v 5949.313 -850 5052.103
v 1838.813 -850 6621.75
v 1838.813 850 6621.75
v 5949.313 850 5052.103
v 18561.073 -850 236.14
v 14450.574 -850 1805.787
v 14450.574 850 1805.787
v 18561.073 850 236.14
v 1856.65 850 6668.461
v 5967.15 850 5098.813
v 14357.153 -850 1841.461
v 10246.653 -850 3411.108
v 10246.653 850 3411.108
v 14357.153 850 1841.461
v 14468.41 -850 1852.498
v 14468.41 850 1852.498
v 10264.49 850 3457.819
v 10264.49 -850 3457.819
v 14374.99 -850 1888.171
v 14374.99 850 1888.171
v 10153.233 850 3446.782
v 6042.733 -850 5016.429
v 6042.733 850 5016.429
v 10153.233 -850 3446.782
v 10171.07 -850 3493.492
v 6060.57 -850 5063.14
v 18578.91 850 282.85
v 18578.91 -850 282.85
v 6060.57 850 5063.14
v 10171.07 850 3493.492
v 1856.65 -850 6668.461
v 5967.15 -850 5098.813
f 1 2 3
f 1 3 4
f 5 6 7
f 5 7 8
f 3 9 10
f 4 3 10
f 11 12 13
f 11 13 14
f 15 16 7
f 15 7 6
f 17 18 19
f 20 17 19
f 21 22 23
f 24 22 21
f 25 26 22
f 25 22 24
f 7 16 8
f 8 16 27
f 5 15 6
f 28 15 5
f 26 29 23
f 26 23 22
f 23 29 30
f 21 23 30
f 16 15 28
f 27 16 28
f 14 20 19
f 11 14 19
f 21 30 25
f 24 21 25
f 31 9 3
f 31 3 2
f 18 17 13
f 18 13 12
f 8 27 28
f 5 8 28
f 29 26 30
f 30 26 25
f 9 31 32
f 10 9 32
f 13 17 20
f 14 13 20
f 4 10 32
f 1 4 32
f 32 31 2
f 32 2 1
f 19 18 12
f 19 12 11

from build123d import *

# Parameters (mm, degrees)
F3_W     = 4400
F3_H     = 1700
F4_DEPTH = 50


with BuildPart() as f4:
    # F3 (on face) → F4 (new body)
    with BuildSketch(Plane(origin=(2458.6537548104, 0, 6438.5777319229), x_dir=(0.9342044743, 0, -0.3567379993), z_dir=(-0.3567379993, 0, -0.9342044743))):
        with Locations((1555.5974960327, 0)):
            Rectangle(F3_W, F3_H)
    extrude(amount=F4_DEPTH)


with BuildPart() as f4b:
    # F3 (on face) → F4, piece 2 (new body)
    with BuildSketch(Plane(origin=(2458.6537548104, 0, 6438.5777319229), x_dir=(0.9342044743, 0, -0.3567379993), z_dir=(-0.3567379993, 0, -0.9342044743))):
        with Locations((6055.5974960327, 0)):
            Rectangle(F3_W, F3_H)
    extrude(amount=F4_DEPTH)


with BuildPart() as f4c:
    # F3 (on face) → F4, piece 3 (new body)
    with BuildSketch(Plane(origin=(2458.6537548104, 0, 6438.5777319229), x_dir=(0.9342044743, 0, -0.3567379993), z_dir=(-0.3567379993, 0, -0.9342044743))):
        with Locations((10555.5974960327, 0)):
            Rectangle(F3_W, F3_H)
    extrude(amount=F4_DEPTH)


with BuildPart() as f4d:
    # F3 (on face) → F4, piece 4 (new body)
    with BuildSketch(Plane(origin=(2458.6537548104, 0, 6438.5777319229), x_dir=(0.9342044743, 0, -0.3567379993), z_dir=(-0.3567379993, 0, -0.9342044743))):
        with Locations((15055.5974960327, 0)):
            Rectangle(F3_W, F3_H)
    extrude(amount=F4_DEPTH)


solid = Compound([f4.part, f4b.part, f4c.part, f4d.part])
